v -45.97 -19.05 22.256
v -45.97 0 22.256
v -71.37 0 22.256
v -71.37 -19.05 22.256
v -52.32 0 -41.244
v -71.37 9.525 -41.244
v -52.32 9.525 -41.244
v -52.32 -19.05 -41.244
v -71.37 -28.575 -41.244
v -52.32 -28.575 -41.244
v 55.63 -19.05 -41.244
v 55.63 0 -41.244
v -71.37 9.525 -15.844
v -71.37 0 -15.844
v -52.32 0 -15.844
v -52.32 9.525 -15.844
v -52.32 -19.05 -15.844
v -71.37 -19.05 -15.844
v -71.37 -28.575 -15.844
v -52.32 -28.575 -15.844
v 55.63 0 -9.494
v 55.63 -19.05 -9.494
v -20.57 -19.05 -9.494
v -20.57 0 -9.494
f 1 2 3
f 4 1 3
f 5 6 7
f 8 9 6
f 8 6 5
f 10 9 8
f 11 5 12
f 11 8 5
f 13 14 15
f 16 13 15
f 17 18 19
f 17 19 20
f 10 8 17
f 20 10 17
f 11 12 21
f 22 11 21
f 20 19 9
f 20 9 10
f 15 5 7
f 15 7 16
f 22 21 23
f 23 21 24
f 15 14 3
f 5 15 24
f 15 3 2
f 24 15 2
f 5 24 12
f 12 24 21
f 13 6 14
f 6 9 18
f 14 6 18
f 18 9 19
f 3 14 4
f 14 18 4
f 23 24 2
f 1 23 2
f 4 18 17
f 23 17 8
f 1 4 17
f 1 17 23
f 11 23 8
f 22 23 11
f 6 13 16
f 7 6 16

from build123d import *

# Parameters (mm, degrees)
F1_DEPTH      = 19.05
F2_W          = 19.05
F2_H          = 25.4
F3_DEPTH      = 9.525
F3_DEPTH_BACK = 28.575


with BuildPart() as f1:
    # F0 (on Front) → F1 (new body)
    with BuildSketch(Plane.XZ):
        Polygon((-71.369838, 22.256227), (-71.369838, -41.243773), (55.630162, -41.243773), (55.630162, -9.493773), (-20.569838, -9.493773), (-45.969838, 22.256227), align=None)
    extrude(amount=F1_DEPTH)

    # F2 (on face) → F3 (join, two sides)
    with BuildSketch(Plane.XZ.offset(19.05)) as f3_sk:
        with Locations((-61.844838, -28.543773)):
            Rectangle(F2_W, F2_H)
    extrude(amount=F3_DEPTH)
    extrude(f3_sk.sketch, amount=-F3_DEPTH_BACK)


solid = f1.part
